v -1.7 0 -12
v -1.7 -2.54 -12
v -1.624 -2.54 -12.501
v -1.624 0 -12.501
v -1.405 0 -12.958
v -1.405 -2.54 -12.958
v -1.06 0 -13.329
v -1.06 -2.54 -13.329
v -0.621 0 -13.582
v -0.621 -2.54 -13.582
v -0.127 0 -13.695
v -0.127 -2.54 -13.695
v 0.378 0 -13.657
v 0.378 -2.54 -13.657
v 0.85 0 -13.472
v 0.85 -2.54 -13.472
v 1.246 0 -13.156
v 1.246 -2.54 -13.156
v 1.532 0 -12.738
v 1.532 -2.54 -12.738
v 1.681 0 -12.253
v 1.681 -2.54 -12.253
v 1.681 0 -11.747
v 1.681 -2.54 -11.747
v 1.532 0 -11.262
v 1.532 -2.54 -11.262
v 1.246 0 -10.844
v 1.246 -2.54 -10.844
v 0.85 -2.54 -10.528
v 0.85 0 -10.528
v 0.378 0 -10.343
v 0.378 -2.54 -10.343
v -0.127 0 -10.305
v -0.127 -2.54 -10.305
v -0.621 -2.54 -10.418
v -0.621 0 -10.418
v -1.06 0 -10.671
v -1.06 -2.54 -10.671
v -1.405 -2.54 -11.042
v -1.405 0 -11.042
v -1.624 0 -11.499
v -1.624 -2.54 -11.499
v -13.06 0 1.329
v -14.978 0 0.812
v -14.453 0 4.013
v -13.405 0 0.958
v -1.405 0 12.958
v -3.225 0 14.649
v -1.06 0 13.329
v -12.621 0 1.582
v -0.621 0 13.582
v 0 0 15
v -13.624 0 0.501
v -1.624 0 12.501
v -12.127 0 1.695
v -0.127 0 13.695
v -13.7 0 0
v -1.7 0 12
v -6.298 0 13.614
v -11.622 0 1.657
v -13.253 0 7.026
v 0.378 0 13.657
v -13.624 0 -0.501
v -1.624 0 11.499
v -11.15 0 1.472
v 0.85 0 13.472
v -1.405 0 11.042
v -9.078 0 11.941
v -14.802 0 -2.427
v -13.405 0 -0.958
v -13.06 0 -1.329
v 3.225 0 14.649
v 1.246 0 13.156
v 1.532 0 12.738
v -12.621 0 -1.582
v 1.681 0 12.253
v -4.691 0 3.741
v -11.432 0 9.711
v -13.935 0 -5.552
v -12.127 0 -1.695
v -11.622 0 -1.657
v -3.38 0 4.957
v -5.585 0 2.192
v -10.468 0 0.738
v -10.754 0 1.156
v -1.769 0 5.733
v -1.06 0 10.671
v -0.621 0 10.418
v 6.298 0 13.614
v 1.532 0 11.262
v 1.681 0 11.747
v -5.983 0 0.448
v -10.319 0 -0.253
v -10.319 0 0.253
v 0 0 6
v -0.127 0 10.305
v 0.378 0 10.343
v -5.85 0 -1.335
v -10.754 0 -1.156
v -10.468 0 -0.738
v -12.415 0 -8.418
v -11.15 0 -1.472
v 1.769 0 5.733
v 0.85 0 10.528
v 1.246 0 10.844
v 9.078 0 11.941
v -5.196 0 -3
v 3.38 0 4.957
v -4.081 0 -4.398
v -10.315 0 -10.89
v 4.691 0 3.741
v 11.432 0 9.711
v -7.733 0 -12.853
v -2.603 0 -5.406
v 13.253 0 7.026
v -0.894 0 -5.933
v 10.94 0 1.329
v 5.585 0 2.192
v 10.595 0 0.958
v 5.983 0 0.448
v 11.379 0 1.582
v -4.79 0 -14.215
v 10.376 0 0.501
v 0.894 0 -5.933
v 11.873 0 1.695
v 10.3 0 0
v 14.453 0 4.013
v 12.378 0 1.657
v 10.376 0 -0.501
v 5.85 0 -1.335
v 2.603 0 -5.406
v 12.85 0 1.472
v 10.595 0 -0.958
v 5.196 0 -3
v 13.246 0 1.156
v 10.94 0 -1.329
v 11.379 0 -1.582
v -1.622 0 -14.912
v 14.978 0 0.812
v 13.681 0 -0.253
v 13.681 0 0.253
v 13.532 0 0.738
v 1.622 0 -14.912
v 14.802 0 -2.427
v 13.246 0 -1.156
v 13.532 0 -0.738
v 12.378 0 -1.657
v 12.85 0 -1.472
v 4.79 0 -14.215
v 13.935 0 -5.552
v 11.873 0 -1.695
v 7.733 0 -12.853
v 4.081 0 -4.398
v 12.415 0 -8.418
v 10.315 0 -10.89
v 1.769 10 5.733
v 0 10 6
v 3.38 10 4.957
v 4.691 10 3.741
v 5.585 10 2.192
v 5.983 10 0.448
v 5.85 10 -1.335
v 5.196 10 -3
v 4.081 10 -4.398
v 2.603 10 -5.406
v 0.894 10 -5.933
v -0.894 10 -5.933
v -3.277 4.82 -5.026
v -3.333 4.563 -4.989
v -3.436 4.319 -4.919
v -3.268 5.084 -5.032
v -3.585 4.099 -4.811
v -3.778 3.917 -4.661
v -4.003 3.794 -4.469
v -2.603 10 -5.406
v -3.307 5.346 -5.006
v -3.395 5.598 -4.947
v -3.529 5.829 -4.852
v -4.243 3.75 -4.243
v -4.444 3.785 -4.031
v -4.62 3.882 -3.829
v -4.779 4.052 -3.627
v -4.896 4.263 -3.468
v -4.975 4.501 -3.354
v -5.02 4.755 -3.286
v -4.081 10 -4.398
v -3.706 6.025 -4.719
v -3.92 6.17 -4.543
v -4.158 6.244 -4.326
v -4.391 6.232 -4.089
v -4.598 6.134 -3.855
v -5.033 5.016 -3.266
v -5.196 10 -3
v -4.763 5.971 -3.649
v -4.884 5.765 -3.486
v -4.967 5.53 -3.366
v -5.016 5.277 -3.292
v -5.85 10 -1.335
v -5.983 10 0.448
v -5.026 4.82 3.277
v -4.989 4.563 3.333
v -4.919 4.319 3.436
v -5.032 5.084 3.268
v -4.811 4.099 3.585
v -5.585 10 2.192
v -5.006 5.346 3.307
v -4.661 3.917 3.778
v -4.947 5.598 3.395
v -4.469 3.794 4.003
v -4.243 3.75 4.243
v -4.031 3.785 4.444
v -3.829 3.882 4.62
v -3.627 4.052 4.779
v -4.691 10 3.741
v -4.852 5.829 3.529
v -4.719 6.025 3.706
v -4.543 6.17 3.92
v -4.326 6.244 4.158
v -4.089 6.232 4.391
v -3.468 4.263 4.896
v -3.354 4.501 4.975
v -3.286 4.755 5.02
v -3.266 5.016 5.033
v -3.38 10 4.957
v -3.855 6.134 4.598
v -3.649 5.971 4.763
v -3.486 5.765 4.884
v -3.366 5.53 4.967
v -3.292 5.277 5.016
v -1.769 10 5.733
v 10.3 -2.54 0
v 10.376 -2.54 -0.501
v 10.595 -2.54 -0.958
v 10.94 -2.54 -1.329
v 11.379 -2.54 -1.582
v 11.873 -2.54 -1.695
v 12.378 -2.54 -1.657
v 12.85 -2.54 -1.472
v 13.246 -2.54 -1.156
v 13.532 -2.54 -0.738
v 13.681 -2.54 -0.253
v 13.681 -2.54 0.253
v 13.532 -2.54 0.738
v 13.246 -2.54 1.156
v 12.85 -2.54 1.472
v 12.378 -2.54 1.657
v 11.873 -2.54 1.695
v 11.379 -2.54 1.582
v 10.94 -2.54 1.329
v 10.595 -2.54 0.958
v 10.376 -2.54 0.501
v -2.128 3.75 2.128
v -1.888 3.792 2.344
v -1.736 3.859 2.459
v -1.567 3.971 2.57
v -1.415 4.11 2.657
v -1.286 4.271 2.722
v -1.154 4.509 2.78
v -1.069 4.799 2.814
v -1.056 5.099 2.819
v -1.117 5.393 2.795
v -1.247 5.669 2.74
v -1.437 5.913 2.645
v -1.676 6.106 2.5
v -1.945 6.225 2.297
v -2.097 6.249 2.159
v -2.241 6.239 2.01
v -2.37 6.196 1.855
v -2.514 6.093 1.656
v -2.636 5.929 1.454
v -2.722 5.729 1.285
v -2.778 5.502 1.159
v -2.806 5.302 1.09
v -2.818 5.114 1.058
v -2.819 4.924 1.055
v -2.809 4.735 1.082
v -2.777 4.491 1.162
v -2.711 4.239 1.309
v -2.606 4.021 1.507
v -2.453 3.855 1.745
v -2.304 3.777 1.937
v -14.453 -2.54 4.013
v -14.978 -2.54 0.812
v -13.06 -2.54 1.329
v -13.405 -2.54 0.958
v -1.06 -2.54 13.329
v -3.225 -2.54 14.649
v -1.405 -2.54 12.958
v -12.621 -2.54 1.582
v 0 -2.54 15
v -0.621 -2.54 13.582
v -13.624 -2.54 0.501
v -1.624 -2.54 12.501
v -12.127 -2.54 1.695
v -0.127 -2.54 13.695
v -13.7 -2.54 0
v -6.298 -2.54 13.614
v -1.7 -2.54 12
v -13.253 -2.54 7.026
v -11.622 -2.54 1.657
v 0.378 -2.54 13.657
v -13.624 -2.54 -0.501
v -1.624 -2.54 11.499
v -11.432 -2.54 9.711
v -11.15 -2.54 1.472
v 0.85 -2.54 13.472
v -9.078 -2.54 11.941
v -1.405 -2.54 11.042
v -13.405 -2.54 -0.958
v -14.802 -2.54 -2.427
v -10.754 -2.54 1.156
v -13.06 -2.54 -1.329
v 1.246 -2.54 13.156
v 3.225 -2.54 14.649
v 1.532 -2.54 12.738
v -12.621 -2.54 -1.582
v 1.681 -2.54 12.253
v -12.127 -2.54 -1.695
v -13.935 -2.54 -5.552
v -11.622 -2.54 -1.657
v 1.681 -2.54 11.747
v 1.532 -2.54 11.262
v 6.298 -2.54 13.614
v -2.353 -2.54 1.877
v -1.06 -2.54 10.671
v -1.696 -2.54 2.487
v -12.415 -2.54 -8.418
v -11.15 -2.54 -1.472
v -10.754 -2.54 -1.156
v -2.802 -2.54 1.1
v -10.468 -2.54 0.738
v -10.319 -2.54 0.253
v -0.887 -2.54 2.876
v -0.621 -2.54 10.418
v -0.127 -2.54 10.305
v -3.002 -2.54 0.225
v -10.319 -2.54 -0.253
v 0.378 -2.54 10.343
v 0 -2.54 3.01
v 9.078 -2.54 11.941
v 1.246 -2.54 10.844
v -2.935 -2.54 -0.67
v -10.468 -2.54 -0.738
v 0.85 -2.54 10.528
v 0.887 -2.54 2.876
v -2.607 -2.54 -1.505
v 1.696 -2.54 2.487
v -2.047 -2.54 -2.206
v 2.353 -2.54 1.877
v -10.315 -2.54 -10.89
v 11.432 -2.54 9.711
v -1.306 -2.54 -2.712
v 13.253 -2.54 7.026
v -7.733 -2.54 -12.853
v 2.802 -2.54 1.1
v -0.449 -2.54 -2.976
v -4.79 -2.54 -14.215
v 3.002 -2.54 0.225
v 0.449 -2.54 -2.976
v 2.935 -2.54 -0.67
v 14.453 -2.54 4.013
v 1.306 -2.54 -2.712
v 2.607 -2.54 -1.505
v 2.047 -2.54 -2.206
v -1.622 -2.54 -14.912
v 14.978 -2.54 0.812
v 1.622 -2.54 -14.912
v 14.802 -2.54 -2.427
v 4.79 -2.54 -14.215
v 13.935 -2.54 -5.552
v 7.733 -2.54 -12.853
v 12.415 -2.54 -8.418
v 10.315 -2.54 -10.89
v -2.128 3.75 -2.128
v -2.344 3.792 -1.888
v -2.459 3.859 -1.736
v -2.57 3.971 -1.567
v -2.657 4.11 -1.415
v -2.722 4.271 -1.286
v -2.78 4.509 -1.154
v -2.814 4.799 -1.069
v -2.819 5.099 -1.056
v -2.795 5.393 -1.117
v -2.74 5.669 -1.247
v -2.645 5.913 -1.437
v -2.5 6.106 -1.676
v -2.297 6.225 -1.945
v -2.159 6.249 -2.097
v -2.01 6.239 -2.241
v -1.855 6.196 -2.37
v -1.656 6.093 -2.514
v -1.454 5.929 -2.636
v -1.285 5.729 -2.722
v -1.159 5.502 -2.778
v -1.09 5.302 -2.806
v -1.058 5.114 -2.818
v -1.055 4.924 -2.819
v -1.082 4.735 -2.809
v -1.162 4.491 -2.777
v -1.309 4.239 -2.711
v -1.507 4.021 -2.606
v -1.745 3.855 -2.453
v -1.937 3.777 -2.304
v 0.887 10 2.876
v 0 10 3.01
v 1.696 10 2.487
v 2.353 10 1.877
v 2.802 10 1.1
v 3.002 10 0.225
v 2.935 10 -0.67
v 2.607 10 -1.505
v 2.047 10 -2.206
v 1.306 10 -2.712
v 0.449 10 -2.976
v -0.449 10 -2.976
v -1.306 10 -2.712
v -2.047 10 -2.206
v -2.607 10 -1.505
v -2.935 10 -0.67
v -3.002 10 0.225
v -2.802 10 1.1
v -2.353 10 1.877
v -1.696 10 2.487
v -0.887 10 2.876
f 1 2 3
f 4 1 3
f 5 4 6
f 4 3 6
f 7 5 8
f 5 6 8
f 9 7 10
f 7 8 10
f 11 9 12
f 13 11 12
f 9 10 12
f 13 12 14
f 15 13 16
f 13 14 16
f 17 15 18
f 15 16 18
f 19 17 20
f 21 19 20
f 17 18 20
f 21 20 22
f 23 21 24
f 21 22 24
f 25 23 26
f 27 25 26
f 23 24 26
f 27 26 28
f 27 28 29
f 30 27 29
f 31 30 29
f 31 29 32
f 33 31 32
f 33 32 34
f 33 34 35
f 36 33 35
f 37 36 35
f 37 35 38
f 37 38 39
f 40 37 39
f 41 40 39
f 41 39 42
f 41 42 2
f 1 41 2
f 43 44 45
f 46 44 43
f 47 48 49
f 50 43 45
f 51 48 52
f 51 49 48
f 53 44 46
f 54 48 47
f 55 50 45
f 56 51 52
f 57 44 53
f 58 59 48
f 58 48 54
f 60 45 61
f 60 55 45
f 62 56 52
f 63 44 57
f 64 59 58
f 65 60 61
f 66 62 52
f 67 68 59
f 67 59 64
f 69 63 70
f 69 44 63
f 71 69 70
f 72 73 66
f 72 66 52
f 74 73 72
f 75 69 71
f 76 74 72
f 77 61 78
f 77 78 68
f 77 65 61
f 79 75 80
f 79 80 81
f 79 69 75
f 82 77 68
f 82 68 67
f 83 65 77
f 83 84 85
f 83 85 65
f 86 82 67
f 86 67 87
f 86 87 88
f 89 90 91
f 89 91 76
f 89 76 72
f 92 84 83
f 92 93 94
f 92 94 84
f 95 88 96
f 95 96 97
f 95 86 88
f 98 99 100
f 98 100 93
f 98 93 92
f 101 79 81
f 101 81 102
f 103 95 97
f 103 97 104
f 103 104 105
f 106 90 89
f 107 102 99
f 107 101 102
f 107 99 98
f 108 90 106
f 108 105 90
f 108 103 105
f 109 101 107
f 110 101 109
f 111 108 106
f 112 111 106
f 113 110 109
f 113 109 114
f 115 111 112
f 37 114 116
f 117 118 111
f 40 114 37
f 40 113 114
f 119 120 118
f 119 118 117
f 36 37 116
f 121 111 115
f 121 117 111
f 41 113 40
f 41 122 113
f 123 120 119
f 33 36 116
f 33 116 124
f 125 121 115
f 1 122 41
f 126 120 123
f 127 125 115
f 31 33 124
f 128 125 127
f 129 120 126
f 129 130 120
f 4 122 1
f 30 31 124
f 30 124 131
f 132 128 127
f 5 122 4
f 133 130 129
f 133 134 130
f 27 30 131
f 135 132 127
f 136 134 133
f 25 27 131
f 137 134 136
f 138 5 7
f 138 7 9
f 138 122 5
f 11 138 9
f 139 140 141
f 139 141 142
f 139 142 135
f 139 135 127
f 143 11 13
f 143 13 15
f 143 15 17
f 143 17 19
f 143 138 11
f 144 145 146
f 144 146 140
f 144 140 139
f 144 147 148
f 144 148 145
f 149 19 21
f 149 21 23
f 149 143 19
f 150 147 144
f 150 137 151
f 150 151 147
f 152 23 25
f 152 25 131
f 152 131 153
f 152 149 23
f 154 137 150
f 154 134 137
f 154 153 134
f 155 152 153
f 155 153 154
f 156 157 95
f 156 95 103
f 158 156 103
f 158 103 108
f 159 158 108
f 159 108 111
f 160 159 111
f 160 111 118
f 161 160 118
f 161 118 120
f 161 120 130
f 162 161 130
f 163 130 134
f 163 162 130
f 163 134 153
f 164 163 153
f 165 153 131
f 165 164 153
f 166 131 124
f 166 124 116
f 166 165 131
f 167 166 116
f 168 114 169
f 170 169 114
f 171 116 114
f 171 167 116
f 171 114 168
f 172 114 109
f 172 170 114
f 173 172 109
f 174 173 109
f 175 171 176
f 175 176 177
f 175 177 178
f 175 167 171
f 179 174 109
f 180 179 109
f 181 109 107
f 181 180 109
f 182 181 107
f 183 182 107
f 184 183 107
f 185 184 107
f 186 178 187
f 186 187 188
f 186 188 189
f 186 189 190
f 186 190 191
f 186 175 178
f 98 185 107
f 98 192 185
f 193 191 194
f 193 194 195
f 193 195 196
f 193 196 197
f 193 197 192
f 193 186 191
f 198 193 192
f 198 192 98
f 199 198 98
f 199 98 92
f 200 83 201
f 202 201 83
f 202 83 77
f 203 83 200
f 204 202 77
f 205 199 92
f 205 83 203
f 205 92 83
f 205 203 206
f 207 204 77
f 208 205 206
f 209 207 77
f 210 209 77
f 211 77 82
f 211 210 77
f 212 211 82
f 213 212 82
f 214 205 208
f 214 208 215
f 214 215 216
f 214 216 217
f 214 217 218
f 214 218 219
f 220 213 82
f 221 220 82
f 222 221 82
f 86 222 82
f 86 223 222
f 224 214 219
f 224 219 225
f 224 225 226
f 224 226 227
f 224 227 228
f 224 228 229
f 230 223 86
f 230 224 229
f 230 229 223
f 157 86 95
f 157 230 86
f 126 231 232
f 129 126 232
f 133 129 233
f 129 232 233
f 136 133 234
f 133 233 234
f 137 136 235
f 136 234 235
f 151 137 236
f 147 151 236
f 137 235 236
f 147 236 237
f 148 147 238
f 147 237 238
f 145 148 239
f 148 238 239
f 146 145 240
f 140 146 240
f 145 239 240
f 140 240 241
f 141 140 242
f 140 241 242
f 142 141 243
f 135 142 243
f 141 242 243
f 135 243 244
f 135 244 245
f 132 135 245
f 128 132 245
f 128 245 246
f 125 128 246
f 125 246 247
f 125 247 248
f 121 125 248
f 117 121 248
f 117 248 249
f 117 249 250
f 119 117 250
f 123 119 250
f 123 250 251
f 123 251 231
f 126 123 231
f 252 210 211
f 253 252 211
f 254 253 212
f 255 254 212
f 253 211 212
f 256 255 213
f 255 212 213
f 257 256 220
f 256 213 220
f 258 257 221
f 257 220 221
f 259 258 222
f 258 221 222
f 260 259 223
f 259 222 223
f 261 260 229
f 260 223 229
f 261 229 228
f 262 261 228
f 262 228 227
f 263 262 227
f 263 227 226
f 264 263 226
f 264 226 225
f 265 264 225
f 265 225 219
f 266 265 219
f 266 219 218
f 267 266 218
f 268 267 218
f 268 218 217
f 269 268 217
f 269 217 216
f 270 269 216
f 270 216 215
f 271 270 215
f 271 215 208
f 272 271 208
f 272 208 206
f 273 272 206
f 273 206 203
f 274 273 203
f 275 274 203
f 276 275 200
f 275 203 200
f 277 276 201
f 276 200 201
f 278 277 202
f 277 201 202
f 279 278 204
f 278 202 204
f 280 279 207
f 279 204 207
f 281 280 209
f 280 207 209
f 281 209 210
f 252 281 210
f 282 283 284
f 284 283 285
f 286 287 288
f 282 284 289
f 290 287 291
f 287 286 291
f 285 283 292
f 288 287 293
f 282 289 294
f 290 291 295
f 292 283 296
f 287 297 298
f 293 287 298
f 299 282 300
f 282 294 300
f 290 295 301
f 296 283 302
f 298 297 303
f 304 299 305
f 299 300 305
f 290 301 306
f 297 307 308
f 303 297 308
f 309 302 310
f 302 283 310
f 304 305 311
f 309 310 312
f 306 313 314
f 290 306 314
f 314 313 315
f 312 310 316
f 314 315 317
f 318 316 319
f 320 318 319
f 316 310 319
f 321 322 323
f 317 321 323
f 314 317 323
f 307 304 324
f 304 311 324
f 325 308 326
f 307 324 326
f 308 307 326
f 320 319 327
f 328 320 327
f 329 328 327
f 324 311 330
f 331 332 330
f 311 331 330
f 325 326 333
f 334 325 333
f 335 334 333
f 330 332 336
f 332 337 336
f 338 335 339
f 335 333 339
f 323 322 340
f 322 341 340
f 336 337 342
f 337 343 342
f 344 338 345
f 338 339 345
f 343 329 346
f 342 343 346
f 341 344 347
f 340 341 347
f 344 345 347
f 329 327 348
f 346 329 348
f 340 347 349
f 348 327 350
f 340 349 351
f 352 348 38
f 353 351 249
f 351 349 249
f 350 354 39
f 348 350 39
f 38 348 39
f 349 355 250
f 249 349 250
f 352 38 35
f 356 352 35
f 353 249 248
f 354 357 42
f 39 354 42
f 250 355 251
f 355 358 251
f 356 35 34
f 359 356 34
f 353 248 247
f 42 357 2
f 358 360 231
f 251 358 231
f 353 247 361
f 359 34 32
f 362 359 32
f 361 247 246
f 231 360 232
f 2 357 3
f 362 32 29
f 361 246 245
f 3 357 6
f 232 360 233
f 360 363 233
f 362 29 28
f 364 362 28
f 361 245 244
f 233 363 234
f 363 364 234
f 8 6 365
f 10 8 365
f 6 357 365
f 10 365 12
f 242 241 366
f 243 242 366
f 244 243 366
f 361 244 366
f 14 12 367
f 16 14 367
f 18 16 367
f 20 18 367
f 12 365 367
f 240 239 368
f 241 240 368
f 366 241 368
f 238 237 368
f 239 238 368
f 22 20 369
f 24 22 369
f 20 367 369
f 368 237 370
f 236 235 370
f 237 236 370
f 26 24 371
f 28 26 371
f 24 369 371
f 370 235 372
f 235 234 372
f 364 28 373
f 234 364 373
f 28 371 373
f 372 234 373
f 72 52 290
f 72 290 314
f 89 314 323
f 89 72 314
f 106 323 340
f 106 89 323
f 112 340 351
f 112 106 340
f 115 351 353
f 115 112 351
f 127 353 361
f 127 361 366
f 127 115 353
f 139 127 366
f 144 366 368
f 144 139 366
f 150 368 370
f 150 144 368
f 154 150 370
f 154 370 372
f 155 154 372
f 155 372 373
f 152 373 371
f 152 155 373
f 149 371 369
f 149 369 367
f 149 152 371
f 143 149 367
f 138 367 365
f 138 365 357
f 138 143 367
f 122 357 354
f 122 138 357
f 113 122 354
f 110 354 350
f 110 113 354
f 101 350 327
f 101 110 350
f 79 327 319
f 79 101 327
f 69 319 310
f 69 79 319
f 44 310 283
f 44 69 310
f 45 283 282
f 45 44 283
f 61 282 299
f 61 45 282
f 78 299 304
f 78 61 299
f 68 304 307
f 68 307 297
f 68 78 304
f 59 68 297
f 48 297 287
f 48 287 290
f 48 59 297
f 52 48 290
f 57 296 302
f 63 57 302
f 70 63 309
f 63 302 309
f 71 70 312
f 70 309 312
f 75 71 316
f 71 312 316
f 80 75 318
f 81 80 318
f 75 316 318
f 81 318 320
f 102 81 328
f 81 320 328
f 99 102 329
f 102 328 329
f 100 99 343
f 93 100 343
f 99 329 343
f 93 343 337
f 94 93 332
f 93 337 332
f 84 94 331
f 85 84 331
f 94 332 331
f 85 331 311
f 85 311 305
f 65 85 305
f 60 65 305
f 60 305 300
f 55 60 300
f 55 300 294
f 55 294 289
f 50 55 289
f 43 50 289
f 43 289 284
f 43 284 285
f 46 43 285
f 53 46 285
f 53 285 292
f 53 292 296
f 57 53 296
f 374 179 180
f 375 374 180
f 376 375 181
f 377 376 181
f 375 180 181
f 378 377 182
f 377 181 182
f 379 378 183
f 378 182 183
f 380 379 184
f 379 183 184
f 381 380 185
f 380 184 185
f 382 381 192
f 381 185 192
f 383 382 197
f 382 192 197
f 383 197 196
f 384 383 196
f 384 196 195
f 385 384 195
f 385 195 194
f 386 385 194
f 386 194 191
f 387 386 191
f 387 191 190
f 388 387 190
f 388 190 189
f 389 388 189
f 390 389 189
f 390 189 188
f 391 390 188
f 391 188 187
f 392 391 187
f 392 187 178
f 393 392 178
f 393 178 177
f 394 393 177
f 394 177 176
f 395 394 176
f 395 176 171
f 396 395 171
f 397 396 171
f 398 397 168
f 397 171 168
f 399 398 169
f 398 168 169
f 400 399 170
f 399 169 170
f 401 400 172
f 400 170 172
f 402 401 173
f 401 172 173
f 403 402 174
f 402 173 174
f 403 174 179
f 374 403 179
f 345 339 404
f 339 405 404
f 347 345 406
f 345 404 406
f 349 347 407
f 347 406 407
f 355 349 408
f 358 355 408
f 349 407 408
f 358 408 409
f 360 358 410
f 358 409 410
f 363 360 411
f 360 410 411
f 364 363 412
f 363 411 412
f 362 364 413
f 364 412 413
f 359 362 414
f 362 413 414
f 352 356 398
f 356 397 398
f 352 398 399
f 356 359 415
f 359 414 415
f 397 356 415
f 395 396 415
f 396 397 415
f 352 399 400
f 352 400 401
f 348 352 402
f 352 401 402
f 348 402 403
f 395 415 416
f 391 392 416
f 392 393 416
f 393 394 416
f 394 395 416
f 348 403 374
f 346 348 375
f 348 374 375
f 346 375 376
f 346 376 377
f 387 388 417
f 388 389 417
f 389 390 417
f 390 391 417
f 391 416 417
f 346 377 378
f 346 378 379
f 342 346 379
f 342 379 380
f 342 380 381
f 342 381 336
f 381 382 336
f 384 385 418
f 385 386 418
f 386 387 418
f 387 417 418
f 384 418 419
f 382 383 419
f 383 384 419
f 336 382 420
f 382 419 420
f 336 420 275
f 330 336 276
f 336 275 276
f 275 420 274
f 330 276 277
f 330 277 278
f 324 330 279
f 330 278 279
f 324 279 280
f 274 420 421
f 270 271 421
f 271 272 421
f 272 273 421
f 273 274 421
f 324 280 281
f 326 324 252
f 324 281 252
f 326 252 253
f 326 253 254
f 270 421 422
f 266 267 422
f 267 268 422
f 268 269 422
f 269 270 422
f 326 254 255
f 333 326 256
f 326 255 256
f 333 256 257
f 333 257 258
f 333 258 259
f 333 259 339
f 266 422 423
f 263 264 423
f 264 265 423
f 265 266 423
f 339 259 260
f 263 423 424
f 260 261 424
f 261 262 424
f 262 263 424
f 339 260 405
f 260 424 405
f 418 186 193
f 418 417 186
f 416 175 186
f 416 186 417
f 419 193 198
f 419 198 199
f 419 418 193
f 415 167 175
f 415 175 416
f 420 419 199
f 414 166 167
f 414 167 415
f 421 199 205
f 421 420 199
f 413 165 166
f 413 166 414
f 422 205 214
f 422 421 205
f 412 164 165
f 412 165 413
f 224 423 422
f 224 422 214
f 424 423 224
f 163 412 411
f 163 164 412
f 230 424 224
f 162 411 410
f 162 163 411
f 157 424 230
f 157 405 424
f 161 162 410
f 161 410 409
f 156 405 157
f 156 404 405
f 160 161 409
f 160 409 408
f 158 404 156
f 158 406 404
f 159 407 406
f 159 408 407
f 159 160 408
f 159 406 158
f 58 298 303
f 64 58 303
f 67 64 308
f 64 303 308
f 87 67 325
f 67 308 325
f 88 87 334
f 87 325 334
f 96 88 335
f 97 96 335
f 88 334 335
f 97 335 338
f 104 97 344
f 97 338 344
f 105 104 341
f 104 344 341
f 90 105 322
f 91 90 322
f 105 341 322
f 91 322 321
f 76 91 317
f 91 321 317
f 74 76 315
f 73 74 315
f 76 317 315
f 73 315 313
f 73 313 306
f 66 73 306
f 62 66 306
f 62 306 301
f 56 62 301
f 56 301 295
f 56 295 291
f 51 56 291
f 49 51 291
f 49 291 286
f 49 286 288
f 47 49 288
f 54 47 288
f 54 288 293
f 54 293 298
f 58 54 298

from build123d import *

# Parameters (mm, degrees)
SKETCH1_R                        = 15
SKETCH1_R_2                      = 6
SKETCH1_R_3                      = 3.01
BOSS_EXTRUDE4_DEPTH              = 2.54
BOSS_EXTRUDE5_START              = 10
SKETCH1_8_R                      = 6
SKETCH1_8_R_2                    = 3.01
BOSS_EXTRUDE5_DEPTH              = 10
M3_CLEARANCE_HOLE1_D             = 3.4
TAP_DRILL_FOR_M3X0_5_TAP1_REACH  = 30.992
TAP_DRILL_FOR_M3X0_5_TAP1_BORE_R = 1.25
TAP_DRILL_FOR_M3X0_5_TAP2_REACH  = 30.992
TAP_DRILL_FOR_M3X0_5_TAP2_BORE_R = 1.25


with BuildPart() as part:
    # Sketch1 → Boss-Extrude4 (new body)
    # profile 1 of 2: a face of its own
    with BuildSketch(Plane(origin=(0, 0, 0), x_dir=(1, 0, 0), z_dir=(0, 1, 0))):
        with Locations(Location((0, 0, 0), (0, 0, 270))):
            Circle(SKETCH1_R)
        Circle(SKETCH1_R_2, mode=Mode.SUBTRACT)
    # profile 2 of 2: a face of its own
    with BuildSketch(Plane(origin=(0, 0, 0), x_dir=(1, 0, 0), z_dir=(0, 1, 0))):
        Circle(SKETCH1_R_2)
        with Locations(Location((0, 0, 0), (0, 0, 270))):
            Circle(SKETCH1_R_3, mode=Mode.SUBTRACT)
    extrude(amount=-BOSS_EXTRUDE4_DEPTH)

    # Sketch1<8> → Boss-Extrude5 (add)
    with BuildSketch(Plane(origin=(0, 0, 0), x_dir=(1, 0, 0), z_dir=(0, 1, 0)).offset(BOSS_EXTRUDE5_START)):
        with Locations(Location((0, 0, 0), (0, 0, 270))):
            Circle(SKETCH1_8_R)
        with Locations(Location((0, 0, 0), (0, 0, 270))):
            Circle(SKETCH1_8_R_2, mode=Mode.SUBTRACT)
    extrude(amount=-BOSS_EXTRUDE5_DEPTH)

    # M3 Clearance Hole1 (through all)
    with Locations(Plane(origin=(0, 0, 0), x_dir=(1, 0, 0), z_dir=(0, 1, 0))):
        with Locations((0, 12), (12, 0), (-12, 0), (0, -12)):
            Hole(M3_CLEARANCE_HOLE1_D / 2)

    # Tap Drill for M3x0.5 Tap1 bore → Tap Drill for M3x0.5 Tap1 (cut, up to next)
    with BuildSketch(Plane(origin=(-4.242640687, 0, -4.242640687), x_dir=(0, -1, 0), z_dir=(-0.7071067811865464, 0, -0.7071067811865488)), mode=Mode.PRIVATE) as tap_drill_for_m3x0_5_tap1_sk1:
        with Locations((-5, 0)):
            Circle(TAP_DRILL_FOR_M3X0_5_TAP1_BORE_R)
    tap_drill_for_m3x0_5_tap1_tool1 = extrude(tap_drill_for_m3x0_5_tap1_sk1.sketch, amount=-TAP_DRILL_FOR_M3X0_5_TAP1_REACH, mode=Mode.PRIVATE) & part.part
    add(tap_drill_for_m3x0_5_tap1_tool1.solids().sort_by_distance((-4.242641, 5, -4.242641))[0], mode=Mode.SUBTRACT)

    # Tap Drill for M3x0.5 Tap2 bore → Tap Drill for M3x0.5 Tap2 (cut, up to next)
    with BuildSketch(Plane(origin=(-4.242640687, 0, 4.242640687), x_dir=(0, -1, 0), z_dir=(-0.7071067811865512, 0, 0.7071067811865438)), mode=Mode.PRIVATE) as tap_drill_for_m3x0_5_tap2_sk1:
        with Locations((-5, 0)):
            Circle(TAP_DRILL_FOR_M3X0_5_TAP2_BORE_R)
    tap_drill_for_m3x0_5_tap2_tool1 = extrude(tap_drill_for_m3x0_5_tap2_sk1.sketch, amount=-TAP_DRILL_FOR_M3X0_5_TAP2_REACH, mode=Mode.PRIVATE) & part.part
    add(tap_drill_for_m3x0_5_tap2_tool1.solids().sort_by_distance((-4.242641, 5, 4.242641))[0], mode=Mode.SUBTRACT)


solid = part.part
